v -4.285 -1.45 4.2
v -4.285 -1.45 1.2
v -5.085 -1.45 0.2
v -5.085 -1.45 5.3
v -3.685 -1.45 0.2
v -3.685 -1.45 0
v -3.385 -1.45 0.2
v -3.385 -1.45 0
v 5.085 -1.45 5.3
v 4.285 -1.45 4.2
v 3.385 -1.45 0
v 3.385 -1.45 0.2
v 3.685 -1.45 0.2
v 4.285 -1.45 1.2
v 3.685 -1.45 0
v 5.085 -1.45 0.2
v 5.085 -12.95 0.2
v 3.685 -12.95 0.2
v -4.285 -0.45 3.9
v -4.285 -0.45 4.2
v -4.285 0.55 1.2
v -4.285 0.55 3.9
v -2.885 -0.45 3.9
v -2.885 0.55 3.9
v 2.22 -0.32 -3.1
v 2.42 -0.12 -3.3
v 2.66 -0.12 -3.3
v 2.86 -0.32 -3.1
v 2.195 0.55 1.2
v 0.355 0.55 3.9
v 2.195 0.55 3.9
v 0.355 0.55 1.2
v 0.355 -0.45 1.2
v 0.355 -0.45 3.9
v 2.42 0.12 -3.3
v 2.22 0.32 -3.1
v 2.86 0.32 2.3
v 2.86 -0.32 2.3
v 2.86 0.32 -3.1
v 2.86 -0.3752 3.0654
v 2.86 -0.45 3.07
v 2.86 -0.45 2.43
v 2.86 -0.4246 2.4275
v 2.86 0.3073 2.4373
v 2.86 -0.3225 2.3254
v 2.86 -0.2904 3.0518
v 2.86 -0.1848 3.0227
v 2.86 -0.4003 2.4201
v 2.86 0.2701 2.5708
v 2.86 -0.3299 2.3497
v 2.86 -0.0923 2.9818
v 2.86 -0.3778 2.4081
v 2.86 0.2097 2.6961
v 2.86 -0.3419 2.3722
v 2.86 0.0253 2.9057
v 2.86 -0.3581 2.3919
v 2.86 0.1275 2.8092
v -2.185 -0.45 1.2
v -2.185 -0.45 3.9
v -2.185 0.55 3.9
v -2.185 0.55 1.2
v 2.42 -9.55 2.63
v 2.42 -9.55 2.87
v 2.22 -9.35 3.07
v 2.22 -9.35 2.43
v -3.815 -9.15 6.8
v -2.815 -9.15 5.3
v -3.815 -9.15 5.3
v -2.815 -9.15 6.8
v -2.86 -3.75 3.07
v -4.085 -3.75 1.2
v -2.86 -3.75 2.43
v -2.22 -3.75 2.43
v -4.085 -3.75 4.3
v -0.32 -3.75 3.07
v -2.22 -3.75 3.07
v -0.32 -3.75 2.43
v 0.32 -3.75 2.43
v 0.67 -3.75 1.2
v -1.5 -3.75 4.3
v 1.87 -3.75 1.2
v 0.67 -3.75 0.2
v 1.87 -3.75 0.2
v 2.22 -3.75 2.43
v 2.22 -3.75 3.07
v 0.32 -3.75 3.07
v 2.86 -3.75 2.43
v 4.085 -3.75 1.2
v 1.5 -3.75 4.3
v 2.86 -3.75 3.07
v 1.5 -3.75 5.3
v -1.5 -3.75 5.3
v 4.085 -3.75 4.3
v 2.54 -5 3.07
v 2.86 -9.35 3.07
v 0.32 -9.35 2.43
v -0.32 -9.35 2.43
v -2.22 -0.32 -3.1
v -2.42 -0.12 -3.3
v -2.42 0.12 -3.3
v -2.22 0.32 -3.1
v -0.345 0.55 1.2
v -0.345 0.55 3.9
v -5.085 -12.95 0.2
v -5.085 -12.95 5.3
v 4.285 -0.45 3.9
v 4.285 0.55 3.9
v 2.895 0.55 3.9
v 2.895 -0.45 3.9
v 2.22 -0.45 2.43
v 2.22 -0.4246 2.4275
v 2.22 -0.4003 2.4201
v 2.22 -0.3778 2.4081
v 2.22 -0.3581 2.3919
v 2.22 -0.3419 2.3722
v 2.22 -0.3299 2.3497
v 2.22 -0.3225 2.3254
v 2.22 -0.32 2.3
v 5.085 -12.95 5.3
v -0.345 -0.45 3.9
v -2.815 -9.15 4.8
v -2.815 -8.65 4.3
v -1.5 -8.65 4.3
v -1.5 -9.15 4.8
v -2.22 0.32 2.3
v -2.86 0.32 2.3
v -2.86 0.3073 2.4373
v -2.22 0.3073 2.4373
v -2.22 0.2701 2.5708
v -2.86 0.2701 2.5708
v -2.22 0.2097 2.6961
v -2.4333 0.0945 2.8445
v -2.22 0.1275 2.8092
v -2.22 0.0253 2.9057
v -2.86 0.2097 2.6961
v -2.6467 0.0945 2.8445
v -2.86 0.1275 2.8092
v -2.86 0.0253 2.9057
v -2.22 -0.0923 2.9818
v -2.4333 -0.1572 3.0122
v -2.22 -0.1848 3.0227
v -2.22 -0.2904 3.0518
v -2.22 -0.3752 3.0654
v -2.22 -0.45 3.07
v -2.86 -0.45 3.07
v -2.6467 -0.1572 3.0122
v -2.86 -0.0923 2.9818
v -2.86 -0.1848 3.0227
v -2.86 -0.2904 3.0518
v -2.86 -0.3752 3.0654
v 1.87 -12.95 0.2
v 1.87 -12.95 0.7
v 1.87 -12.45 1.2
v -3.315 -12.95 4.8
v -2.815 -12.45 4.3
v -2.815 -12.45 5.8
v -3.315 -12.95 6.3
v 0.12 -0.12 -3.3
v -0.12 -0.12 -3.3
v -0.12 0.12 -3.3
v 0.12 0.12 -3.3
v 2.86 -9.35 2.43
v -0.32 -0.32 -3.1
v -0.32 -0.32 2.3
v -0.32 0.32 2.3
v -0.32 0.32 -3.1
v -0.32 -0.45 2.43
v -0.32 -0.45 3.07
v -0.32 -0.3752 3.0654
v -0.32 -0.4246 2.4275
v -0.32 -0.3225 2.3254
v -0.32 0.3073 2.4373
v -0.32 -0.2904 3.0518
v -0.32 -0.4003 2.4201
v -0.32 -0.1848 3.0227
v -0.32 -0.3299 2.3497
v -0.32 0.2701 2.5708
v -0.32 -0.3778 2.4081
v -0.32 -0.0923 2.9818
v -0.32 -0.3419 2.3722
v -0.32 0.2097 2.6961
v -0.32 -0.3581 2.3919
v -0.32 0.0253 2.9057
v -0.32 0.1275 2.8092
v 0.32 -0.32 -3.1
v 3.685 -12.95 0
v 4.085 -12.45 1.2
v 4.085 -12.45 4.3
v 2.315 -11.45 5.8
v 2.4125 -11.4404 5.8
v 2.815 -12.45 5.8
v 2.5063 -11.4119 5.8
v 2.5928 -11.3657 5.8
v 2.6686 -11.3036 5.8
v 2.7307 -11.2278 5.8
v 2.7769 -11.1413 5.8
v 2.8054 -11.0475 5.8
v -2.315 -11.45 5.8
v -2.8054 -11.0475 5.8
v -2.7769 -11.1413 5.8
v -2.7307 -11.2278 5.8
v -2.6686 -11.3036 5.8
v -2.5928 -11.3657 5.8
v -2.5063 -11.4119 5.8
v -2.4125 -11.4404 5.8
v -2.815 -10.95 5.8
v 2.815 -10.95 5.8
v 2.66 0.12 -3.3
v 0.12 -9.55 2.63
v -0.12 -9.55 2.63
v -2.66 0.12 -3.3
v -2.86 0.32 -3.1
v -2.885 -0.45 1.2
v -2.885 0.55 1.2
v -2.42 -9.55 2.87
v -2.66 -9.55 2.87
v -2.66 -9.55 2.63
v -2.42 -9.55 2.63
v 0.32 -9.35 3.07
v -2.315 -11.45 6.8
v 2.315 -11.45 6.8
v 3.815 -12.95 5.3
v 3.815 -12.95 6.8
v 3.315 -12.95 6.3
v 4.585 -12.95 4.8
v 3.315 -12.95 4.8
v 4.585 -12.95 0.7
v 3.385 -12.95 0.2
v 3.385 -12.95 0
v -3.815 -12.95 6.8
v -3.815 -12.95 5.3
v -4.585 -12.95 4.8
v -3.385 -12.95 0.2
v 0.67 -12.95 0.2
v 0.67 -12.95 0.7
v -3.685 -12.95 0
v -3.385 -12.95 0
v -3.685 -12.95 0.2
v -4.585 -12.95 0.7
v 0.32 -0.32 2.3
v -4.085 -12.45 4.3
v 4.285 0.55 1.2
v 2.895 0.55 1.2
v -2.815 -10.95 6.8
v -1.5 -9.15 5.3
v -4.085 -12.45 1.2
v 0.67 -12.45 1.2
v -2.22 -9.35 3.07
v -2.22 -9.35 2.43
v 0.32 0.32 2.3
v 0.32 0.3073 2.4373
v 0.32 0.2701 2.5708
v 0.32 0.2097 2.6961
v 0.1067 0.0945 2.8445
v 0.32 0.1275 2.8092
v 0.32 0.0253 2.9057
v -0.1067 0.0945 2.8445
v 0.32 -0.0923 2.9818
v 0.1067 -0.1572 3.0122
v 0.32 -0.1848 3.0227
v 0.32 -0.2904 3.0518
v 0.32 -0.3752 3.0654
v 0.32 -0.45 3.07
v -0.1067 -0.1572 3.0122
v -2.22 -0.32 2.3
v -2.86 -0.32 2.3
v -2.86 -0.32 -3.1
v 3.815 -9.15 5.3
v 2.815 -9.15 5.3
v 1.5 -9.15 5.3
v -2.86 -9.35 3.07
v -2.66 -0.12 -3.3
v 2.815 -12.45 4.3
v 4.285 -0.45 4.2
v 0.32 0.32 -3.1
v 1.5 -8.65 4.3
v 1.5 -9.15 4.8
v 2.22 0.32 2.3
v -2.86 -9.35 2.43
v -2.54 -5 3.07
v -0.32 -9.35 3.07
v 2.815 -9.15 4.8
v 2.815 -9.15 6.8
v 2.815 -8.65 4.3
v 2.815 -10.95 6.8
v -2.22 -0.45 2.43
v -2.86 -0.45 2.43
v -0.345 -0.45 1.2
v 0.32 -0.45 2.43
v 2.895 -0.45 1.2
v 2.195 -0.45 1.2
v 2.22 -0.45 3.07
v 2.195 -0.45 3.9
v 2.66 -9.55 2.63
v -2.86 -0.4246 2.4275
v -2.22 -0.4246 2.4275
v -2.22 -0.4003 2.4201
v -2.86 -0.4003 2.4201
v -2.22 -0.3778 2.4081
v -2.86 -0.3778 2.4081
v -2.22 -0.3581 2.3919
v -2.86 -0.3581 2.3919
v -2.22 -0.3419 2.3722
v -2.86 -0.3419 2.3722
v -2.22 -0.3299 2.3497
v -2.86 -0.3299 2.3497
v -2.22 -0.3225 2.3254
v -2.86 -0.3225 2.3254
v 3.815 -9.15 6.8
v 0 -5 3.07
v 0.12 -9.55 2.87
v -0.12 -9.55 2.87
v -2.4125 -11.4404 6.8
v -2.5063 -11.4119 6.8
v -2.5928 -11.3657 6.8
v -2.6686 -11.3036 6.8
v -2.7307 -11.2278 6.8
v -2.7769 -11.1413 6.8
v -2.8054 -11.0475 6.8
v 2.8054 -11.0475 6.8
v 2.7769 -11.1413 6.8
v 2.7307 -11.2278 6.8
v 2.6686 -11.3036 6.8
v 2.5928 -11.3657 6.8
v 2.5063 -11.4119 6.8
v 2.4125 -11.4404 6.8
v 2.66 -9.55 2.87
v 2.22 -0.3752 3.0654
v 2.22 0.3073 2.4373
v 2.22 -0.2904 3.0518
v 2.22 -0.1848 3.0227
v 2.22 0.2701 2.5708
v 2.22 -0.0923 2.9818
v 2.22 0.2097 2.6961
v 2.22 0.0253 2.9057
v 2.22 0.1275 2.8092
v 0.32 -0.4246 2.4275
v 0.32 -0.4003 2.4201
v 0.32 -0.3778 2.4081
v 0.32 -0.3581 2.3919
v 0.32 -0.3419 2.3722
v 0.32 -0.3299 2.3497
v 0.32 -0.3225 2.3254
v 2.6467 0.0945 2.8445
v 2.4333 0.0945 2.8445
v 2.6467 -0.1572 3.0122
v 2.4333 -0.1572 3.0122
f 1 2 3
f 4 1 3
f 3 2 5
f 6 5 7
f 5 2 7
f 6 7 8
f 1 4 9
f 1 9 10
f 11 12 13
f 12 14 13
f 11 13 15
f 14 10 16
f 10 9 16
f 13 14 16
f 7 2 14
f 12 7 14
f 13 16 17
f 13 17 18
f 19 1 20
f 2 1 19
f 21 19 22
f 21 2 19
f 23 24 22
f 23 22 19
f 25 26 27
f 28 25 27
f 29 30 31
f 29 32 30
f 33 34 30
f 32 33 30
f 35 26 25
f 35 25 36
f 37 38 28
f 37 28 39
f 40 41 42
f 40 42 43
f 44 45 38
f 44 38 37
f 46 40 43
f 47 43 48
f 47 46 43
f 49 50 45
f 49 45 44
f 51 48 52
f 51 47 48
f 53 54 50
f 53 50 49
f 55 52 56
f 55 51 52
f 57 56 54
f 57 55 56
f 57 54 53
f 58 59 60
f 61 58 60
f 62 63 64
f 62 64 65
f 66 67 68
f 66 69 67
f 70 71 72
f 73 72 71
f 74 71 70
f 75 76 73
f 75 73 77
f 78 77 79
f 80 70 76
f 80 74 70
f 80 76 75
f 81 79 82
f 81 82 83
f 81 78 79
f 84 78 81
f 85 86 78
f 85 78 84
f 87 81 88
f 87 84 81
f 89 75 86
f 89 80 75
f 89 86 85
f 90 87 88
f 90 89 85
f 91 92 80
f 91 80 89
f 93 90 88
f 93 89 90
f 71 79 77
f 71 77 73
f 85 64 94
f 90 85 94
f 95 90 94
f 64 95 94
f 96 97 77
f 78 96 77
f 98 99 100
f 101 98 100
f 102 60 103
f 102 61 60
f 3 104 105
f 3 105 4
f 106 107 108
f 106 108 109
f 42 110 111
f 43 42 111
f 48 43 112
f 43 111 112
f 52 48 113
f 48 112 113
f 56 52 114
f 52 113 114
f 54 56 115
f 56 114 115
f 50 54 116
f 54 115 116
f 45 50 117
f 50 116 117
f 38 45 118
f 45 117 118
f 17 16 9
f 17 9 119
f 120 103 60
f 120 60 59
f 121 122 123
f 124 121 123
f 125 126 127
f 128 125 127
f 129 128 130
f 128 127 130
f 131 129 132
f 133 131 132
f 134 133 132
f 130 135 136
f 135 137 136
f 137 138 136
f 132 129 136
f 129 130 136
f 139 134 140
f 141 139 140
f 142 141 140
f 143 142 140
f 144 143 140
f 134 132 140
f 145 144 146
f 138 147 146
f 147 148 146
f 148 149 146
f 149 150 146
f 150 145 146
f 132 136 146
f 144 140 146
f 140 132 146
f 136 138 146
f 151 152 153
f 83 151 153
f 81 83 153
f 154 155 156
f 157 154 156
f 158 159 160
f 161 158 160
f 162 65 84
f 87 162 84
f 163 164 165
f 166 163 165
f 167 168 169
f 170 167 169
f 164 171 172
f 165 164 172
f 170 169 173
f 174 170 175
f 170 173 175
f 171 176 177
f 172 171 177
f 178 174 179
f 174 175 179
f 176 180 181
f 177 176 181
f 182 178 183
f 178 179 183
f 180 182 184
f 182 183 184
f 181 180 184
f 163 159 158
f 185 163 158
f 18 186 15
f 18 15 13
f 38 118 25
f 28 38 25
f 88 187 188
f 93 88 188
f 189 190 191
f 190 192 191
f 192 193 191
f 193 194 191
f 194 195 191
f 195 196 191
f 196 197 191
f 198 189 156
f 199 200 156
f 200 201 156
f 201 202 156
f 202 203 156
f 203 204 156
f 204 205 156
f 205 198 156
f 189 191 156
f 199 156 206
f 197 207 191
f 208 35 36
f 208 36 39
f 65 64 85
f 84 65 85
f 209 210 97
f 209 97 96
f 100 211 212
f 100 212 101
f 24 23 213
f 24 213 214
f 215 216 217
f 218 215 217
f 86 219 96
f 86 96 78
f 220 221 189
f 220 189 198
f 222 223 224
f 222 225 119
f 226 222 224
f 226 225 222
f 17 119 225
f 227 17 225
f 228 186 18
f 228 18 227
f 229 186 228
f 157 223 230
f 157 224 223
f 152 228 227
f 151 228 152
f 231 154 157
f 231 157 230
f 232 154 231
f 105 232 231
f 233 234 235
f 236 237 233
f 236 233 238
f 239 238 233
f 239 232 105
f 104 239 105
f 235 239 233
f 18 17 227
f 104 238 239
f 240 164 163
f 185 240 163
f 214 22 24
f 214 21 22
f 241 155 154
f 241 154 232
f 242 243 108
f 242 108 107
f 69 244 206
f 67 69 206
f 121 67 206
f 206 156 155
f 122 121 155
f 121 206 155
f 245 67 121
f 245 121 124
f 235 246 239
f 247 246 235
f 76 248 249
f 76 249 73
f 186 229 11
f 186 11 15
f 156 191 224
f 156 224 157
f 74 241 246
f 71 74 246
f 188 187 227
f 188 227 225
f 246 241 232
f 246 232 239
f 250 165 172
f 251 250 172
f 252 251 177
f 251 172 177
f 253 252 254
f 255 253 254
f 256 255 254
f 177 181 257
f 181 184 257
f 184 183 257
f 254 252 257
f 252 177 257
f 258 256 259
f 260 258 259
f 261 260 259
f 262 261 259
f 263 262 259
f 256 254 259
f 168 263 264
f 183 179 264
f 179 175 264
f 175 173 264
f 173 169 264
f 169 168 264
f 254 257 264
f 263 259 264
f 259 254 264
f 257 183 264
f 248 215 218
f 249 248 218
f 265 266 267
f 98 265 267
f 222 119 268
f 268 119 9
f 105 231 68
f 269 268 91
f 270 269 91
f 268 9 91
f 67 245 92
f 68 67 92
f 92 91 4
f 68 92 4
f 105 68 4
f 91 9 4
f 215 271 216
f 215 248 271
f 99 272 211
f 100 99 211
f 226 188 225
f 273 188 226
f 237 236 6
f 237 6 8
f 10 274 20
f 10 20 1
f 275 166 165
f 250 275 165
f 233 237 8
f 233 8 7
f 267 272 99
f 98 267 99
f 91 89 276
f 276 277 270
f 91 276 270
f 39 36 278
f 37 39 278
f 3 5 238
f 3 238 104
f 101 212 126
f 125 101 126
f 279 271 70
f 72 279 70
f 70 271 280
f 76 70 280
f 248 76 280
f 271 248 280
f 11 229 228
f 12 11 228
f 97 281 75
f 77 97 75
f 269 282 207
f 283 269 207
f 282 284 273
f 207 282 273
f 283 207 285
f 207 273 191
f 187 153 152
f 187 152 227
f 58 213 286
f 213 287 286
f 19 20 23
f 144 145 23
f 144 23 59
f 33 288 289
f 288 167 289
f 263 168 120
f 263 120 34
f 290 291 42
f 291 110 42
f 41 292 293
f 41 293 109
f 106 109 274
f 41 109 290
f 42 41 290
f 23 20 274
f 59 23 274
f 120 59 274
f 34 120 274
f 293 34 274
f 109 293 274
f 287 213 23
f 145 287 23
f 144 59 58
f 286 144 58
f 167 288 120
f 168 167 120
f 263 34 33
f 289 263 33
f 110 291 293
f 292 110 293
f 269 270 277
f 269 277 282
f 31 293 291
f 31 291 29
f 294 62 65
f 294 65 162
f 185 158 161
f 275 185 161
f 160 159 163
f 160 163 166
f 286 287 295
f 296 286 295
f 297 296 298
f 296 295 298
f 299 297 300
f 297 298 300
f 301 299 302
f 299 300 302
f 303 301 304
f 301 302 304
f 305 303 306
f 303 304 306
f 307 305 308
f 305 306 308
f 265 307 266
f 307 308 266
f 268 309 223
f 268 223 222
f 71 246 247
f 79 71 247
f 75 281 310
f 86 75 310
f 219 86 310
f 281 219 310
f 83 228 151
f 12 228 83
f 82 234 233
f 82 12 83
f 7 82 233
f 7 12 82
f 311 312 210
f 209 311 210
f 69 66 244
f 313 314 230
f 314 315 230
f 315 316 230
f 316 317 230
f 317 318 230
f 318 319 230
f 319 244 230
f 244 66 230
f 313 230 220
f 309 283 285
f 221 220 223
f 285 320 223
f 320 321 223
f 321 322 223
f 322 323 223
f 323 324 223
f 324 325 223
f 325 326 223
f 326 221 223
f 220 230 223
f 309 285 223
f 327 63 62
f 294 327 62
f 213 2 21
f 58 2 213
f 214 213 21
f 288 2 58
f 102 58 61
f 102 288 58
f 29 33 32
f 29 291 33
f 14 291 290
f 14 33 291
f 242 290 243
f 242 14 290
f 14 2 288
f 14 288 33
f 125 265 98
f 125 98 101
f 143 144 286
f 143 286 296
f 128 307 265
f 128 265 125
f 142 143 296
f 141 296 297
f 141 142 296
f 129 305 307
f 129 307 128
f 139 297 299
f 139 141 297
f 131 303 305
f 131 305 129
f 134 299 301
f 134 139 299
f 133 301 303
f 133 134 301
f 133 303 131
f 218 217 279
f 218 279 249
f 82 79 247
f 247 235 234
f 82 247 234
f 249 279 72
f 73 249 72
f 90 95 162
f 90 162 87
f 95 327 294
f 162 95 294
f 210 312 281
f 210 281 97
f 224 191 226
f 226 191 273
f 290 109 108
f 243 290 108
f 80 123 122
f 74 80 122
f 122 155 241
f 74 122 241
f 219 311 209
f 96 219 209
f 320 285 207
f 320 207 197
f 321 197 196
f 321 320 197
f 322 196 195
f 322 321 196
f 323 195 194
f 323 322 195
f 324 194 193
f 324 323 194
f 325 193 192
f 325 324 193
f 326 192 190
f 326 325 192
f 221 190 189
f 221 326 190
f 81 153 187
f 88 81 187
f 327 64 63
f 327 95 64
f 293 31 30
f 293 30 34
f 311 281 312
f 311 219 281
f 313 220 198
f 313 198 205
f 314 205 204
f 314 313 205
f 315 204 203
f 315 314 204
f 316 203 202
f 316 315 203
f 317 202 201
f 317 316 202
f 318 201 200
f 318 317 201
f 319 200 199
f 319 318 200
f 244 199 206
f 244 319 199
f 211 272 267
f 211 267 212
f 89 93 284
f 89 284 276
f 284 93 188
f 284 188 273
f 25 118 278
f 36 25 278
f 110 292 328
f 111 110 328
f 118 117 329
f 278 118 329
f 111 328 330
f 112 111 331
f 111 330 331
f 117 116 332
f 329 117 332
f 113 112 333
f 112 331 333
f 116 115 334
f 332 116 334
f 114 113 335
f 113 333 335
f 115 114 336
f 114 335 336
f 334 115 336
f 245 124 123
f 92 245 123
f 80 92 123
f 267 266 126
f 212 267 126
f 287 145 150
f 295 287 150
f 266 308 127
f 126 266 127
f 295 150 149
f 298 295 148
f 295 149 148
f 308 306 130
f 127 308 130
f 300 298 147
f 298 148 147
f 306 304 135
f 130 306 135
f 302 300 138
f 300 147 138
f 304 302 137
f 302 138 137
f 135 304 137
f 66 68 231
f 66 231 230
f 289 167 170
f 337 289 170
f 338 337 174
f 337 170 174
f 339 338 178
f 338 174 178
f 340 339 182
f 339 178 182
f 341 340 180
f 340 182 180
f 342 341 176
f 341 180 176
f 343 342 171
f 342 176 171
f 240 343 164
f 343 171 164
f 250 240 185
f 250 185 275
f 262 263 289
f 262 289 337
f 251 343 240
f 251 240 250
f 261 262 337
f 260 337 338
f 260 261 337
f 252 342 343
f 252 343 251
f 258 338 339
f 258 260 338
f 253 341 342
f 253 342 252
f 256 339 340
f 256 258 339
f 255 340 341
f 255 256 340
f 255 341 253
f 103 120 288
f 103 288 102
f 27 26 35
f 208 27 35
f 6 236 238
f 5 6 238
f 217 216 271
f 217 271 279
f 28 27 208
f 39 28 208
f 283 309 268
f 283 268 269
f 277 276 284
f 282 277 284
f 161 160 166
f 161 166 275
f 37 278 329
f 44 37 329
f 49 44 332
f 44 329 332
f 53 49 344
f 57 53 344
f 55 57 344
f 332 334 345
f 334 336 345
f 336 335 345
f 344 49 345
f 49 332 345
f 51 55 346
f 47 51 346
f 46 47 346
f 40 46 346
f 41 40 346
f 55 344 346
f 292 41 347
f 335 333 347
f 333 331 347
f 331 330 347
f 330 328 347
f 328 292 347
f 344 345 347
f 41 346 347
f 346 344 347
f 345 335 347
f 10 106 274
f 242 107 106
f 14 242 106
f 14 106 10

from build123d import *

# Parameters (mm, degrees)
EXTRUDE_START                      = 0.2
EXTRUDE_1_DEPTH                    = 5.1
SKETCH_7_W                         = 0.3
SKETCH_7_H                         = 0.2
EXTRUDE_4_DEPTH                    = 11.5
SKETCH_8_W                         = 1
SKETCH_8_H                         = 2
CUT_EXTRUDE_5_DEPTH                = 8.57
CUT_EXTRUDE_1_DEPTH                = 9.2
EXTRUDE_2_DEPTH                    = 3.8
SKETCH_4_W                         = 5.63
SKETCH_4_H                         = 1
CUT_EXTRUDE_2_DEPTH                = 3.8
CUT_EXTRUDE_3_REACH                = 17.485
CHAMFER_1_SIZE                     = 0.5
CUT_EXTRUDE_6_REACH                = 16.449
SKETCH_9_W                         = 0.7
SKETCH_9_H                         = 1
SWEEP_START                        = 2.22
SWEEP_1_DEPTH                      = 0.64
CHAMFER_2_SIZE                     = 0.2
PATTERN_LINEAR_2_COUNT             = 3
PATTERN_LINEAR_2_PITCH             = 2.54
PATTERN_LINEAR_1_COUNT             = 3
PATTERN_LINEAR_1_PITCH             = 2.54
CHAMFER_2_OF_PATTERN_LINEAR_1_SIZE = 0.2


# Read off the part's stored shape, not the designer's step: По траектории1
with BuildPart() as part:
    # Эскиз1 → Бобышка-Вытянуть1 (new body)
    with BuildSketch(Plane.XY.offset(EXTRUDE_START)):
        Polygon((-4.285, 0.55), (4.285, 0.55), (4.285, -1.45), (5.085, -1.45), (5.085, -12.95), (-5.085, -12.95), (-5.085, -1.45), (-4.285, -1.45), align=None)
    extrude(amount=EXTRUDE_1_DEPTH)

    # Эскиз7 → Бобышка-Вытянуть4 (add)
    with BuildSketch(Plane.XZ.offset(12.95)):
        with Locations((3.535, 0.1)):
            Rectangle(SKETCH_7_W, SKETCH_7_H)
        with Locations((-3.535, 0.1)):
            Rectangle(SKETCH_7_W, SKETCH_7_H)
    extrude(amount=-EXTRUDE_4_DEPTH)

    # Эскиз8 → Вырез-Вытянуть5 (cut)
    with BuildSketch(Plane(origin=(4.285, 0, 0), x_dir=(0, 0, -1), z_dir=(1, 0, 0))):
        with Locations((-0.7, -0.45)):
            Rectangle(SKETCH_8_W, SKETCH_8_H)
        Polygon((-4.2, -1.45), (-5.3, -1.45), (-5.3, 0.55), (-3.9, 0.55), (-3.9, -0.45), (-4.2, -0.45), align=None)
    extrude(amount=-CUT_EXTRUDE_5_DEPTH, mode=Mode.SUBTRACT)

    # Эскиз2 → Вырез-Вытянуть1 (cut)
    with BuildSketch(Plane.XZ.offset(12.95)):
        Polygon((-4.085, 4.3), (-4.085, 1.2), (0.67, 1.2), (0.67, 0.2), (1.87, 0.2), (1.87, 1.2), (4.085, 1.2), (4.085, 4.3), (1.5, 4.3), (1.5, 5.3), (-1.5, 5.3), (-1.5, 4.3), align=None)
    extrude(amount=-CUT_EXTRUDE_1_DEPTH, mode=Mode.SUBTRACT)

    # Эскиз3 → Бобышка-Вытянуть2 (add)
    with BuildSketch(Plane.XZ.offset(12.95)):
        Polygon((-3.815, 5.3), (-3.815, 6.8), (3.815, 6.8), (3.815, 5.3), (2.815, 5.3), (2.815, 5.8), (-2.815, 5.8), (-2.815, 5.3), align=None)
    extrude(amount=-EXTRUDE_2_DEPTH)

    # Эскиз4 → Вырез-Вытянуть2 (cut)
    with BuildSketch(Plane.XZ.offset(12.95)):
        with Locations((0, 4.8)):
            Rectangle(SKETCH_4_W, SKETCH_4_H)
    extrude(amount=-CUT_EXTRUDE_2_DEPTH, mode=Mode.SUBTRACT)

    # Эскиз5 → Вырез-Вытянуть3 (cut, up to next)
    with BuildSketch(Plane.XY.offset(6.8), mode=Mode.PRIVATE) as cut_extrude_3_sk1:
        with BuildLine():
            Line((2.815, -9.15), (2.815, -10.95))
            ThreePointArc((2.815, -10.95), (2.668553391, -11.303553391), (2.315, -11.45))
            Line((2.315, -11.45), (-2.315, -11.45))
            ThreePointArc((-2.315, -11.45), (-2.668553391, -11.303553391), (-2.815, -10.95))
            Line((-2.815, -10.95), (-2.815, -9.15))
            Line((-2.815, -9.15), (2.815, -9.15))
        make_face()
    cut_extrude_3_tool1 = extrude(cut_extrude_3_sk1.sketch, amount=-CUT_EXTRUDE_3_REACH, mode=Mode.PRIVATE) & part.part
    add(cut_extrude_3_tool1.solids().sort_by_distance((0, -10.291324, 6.8))[0], mode=Mode.SUBTRACT)

    # Фаска1
    chamfer_1_edges = [part.edges().sort_by_distance(p)[0] for p in [
        (-2.815, -12.95, 5.05),
        (0, -12.95, 5.8),
        (2.815, -12.95, 5.05),
        (2.1575, -9.15, 4.3),
        (-3.45, -12.95, 4.3),
        (-2.1575, -9.15, 4.3),
        (-4.085, -12.95, 2.75),
        (-1.7075, -12.95, 1.2),
        (2.9775, -12.95, 1.2),
        (4.085, -12.95, 2.75),
        (3.45, -12.95, 4.3),
    ]]
    chamfer(chamfer_1_edges, length=CHAMFER_1_SIZE)

    # Эскиз9 → Вырез-Вытянуть6 (cut, up to next)
    with BuildSketch(Plane.XY.offset(3.9), mode=Mode.PRIVATE) as cut_extrude_6_sk1:
        with Locations((2.545, 0.05)):
            Rectangle(SKETCH_9_W, SKETCH_9_H)
    cut_extrude_6_tool1 = extrude(cut_extrude_6_sk1.sketch, amount=-CUT_EXTRUDE_6_REACH, mode=Mode.PRIVATE) & part.part
    cut_extrude_6 = cut_extrude_6_tool1.solids().sort_by_distance((2.545, 0.05, 3.9))[0]
    add(cut_extrude_6, mode=Mode.SUBTRACT)

    # По траектории1 outline → По траектории1 (add)
    with BuildSketch(Plane.YZ.offset(SWEEP_START)):
        with BuildLine():
            Line((-3.75, 2.43), (-3.75, 3.07))
            add(Edge.make_bspline(
                [(-3.75, 3.07), (-4.166666667, 3.07), (-4.583333333, 3.07), (-6.516666667, 3.07), (-8.033333333, 3.07), (-9.55, 3.07)],
                knots=[0.623544277, 0.623544277, 0.623544277, 0.623544277, 0.704676976, 0.704676976, 1, 1, 1, 1], degree=3))
            Line((-9.55, 3.07), (-9.55, 2.43))
            Line((-9.55, 2.43), (-3.75, 2.43))
        make_face()
        with BuildLine():
            Line((0.32, -3.3), (0.32, 2.3))
            add(Edge.make_bspline(
                [(0.32, 2.3), (0.32, 2.499654349), (0.23877091, 2.700173533), (0.022322877, 2.916621566), (-0.064240468, 2.973940923), (-0.250203983, 3.050392149), (-0.370157621, 3.069944018), (-0.45, 3.07)],
                knots=[0.363474491, 0.363474491, 0.363474491, 0.363474491, 0.386414221, 0.386414221, 0.397884087, 0.397884087, 0.409353952, 0.409353952, 0.409353952, 0.409353952], degree=3))
            Line((-0.45, 3.07), (-0.45, 2.43))
            ThreePointArc((-0.45, 2.43), (-0.358076118, 2.391923882), (-0.32, 2.3))
            Line((-0.32, 2.3), (-0.32, -3.3))
            Line((-0.32, -3.3), (0.32, -3.3))
        make_face()
    sweep_1 = extrude(amount=SWEEP_1_DEPTH)

    # Фаска2
    chamfer_2_edges = [part.edges().sort_by_distance(p)[0] for p in [
        (2.54, -9.55, 3.07),
        (2.86, -9.55, 2.75),
        (2.54, -9.55, 2.43),
        (2.22, -9.55, 2.75),
        (2.54, -0.32, -3.3),
        (2.86, 0, -3.3),
        (2.54, 0.32, -3.3),
        (2.22, 0, -3.3),
    ]]
    chamfer(chamfer_2_edges, length=CHAMFER_2_SIZE)

    # Линейный массив2: Вырез-Вытянуть6 ×3
    with Locations(*[(-i * PATTERN_LINEAR_2_PITCH, 0, 0) for i in range(1, PATTERN_LINEAR_2_COUNT)]):
        add(cut_extrude_6, mode=Mode.SUBTRACT)

    # Линейный массив1: По траектории1 ×3
    with Locations(*[(-i * PATTERN_LINEAR_1_PITCH, 0, 0) for i in range(1, PATTERN_LINEAR_1_COUNT)]):
        add(sweep_1)

    # Фаска2 of Линейный массив1
    chamfer_2_of_pattern_linear_1_edges = [part.edges().sort_by_distance(p)[0] for p in [
        (0, -9.55, 3.07),
        (0.32, -9.55, 2.75),
        (0, -9.55, 2.43),
        (-0.32, -9.55, 2.75),
        (0, -0.32, -3.3),
        (0.32, 0, -3.3),
        (0, 0.32, -3.3),
        (-0.32, 0, -3.3),
        (-2.54, -9.55, 3.07),
        (-2.22, -9.55, 2.75),
        (-2.54, -9.55, 2.43),
        (-2.86, -9.55, 2.75),
        (-2.54, -0.32, -3.3),
        (-2.22, 0, -3.3),
        (-2.54, 0.32, -3.3),
        (-2.86, 0, -3.3),
    ]]
    chamfer(chamfer_2_of_pattern_linear_1_edges, length=CHAMFER_2_OF_PATTERN_LINEAR_1_SIZE)


solid = part.part
